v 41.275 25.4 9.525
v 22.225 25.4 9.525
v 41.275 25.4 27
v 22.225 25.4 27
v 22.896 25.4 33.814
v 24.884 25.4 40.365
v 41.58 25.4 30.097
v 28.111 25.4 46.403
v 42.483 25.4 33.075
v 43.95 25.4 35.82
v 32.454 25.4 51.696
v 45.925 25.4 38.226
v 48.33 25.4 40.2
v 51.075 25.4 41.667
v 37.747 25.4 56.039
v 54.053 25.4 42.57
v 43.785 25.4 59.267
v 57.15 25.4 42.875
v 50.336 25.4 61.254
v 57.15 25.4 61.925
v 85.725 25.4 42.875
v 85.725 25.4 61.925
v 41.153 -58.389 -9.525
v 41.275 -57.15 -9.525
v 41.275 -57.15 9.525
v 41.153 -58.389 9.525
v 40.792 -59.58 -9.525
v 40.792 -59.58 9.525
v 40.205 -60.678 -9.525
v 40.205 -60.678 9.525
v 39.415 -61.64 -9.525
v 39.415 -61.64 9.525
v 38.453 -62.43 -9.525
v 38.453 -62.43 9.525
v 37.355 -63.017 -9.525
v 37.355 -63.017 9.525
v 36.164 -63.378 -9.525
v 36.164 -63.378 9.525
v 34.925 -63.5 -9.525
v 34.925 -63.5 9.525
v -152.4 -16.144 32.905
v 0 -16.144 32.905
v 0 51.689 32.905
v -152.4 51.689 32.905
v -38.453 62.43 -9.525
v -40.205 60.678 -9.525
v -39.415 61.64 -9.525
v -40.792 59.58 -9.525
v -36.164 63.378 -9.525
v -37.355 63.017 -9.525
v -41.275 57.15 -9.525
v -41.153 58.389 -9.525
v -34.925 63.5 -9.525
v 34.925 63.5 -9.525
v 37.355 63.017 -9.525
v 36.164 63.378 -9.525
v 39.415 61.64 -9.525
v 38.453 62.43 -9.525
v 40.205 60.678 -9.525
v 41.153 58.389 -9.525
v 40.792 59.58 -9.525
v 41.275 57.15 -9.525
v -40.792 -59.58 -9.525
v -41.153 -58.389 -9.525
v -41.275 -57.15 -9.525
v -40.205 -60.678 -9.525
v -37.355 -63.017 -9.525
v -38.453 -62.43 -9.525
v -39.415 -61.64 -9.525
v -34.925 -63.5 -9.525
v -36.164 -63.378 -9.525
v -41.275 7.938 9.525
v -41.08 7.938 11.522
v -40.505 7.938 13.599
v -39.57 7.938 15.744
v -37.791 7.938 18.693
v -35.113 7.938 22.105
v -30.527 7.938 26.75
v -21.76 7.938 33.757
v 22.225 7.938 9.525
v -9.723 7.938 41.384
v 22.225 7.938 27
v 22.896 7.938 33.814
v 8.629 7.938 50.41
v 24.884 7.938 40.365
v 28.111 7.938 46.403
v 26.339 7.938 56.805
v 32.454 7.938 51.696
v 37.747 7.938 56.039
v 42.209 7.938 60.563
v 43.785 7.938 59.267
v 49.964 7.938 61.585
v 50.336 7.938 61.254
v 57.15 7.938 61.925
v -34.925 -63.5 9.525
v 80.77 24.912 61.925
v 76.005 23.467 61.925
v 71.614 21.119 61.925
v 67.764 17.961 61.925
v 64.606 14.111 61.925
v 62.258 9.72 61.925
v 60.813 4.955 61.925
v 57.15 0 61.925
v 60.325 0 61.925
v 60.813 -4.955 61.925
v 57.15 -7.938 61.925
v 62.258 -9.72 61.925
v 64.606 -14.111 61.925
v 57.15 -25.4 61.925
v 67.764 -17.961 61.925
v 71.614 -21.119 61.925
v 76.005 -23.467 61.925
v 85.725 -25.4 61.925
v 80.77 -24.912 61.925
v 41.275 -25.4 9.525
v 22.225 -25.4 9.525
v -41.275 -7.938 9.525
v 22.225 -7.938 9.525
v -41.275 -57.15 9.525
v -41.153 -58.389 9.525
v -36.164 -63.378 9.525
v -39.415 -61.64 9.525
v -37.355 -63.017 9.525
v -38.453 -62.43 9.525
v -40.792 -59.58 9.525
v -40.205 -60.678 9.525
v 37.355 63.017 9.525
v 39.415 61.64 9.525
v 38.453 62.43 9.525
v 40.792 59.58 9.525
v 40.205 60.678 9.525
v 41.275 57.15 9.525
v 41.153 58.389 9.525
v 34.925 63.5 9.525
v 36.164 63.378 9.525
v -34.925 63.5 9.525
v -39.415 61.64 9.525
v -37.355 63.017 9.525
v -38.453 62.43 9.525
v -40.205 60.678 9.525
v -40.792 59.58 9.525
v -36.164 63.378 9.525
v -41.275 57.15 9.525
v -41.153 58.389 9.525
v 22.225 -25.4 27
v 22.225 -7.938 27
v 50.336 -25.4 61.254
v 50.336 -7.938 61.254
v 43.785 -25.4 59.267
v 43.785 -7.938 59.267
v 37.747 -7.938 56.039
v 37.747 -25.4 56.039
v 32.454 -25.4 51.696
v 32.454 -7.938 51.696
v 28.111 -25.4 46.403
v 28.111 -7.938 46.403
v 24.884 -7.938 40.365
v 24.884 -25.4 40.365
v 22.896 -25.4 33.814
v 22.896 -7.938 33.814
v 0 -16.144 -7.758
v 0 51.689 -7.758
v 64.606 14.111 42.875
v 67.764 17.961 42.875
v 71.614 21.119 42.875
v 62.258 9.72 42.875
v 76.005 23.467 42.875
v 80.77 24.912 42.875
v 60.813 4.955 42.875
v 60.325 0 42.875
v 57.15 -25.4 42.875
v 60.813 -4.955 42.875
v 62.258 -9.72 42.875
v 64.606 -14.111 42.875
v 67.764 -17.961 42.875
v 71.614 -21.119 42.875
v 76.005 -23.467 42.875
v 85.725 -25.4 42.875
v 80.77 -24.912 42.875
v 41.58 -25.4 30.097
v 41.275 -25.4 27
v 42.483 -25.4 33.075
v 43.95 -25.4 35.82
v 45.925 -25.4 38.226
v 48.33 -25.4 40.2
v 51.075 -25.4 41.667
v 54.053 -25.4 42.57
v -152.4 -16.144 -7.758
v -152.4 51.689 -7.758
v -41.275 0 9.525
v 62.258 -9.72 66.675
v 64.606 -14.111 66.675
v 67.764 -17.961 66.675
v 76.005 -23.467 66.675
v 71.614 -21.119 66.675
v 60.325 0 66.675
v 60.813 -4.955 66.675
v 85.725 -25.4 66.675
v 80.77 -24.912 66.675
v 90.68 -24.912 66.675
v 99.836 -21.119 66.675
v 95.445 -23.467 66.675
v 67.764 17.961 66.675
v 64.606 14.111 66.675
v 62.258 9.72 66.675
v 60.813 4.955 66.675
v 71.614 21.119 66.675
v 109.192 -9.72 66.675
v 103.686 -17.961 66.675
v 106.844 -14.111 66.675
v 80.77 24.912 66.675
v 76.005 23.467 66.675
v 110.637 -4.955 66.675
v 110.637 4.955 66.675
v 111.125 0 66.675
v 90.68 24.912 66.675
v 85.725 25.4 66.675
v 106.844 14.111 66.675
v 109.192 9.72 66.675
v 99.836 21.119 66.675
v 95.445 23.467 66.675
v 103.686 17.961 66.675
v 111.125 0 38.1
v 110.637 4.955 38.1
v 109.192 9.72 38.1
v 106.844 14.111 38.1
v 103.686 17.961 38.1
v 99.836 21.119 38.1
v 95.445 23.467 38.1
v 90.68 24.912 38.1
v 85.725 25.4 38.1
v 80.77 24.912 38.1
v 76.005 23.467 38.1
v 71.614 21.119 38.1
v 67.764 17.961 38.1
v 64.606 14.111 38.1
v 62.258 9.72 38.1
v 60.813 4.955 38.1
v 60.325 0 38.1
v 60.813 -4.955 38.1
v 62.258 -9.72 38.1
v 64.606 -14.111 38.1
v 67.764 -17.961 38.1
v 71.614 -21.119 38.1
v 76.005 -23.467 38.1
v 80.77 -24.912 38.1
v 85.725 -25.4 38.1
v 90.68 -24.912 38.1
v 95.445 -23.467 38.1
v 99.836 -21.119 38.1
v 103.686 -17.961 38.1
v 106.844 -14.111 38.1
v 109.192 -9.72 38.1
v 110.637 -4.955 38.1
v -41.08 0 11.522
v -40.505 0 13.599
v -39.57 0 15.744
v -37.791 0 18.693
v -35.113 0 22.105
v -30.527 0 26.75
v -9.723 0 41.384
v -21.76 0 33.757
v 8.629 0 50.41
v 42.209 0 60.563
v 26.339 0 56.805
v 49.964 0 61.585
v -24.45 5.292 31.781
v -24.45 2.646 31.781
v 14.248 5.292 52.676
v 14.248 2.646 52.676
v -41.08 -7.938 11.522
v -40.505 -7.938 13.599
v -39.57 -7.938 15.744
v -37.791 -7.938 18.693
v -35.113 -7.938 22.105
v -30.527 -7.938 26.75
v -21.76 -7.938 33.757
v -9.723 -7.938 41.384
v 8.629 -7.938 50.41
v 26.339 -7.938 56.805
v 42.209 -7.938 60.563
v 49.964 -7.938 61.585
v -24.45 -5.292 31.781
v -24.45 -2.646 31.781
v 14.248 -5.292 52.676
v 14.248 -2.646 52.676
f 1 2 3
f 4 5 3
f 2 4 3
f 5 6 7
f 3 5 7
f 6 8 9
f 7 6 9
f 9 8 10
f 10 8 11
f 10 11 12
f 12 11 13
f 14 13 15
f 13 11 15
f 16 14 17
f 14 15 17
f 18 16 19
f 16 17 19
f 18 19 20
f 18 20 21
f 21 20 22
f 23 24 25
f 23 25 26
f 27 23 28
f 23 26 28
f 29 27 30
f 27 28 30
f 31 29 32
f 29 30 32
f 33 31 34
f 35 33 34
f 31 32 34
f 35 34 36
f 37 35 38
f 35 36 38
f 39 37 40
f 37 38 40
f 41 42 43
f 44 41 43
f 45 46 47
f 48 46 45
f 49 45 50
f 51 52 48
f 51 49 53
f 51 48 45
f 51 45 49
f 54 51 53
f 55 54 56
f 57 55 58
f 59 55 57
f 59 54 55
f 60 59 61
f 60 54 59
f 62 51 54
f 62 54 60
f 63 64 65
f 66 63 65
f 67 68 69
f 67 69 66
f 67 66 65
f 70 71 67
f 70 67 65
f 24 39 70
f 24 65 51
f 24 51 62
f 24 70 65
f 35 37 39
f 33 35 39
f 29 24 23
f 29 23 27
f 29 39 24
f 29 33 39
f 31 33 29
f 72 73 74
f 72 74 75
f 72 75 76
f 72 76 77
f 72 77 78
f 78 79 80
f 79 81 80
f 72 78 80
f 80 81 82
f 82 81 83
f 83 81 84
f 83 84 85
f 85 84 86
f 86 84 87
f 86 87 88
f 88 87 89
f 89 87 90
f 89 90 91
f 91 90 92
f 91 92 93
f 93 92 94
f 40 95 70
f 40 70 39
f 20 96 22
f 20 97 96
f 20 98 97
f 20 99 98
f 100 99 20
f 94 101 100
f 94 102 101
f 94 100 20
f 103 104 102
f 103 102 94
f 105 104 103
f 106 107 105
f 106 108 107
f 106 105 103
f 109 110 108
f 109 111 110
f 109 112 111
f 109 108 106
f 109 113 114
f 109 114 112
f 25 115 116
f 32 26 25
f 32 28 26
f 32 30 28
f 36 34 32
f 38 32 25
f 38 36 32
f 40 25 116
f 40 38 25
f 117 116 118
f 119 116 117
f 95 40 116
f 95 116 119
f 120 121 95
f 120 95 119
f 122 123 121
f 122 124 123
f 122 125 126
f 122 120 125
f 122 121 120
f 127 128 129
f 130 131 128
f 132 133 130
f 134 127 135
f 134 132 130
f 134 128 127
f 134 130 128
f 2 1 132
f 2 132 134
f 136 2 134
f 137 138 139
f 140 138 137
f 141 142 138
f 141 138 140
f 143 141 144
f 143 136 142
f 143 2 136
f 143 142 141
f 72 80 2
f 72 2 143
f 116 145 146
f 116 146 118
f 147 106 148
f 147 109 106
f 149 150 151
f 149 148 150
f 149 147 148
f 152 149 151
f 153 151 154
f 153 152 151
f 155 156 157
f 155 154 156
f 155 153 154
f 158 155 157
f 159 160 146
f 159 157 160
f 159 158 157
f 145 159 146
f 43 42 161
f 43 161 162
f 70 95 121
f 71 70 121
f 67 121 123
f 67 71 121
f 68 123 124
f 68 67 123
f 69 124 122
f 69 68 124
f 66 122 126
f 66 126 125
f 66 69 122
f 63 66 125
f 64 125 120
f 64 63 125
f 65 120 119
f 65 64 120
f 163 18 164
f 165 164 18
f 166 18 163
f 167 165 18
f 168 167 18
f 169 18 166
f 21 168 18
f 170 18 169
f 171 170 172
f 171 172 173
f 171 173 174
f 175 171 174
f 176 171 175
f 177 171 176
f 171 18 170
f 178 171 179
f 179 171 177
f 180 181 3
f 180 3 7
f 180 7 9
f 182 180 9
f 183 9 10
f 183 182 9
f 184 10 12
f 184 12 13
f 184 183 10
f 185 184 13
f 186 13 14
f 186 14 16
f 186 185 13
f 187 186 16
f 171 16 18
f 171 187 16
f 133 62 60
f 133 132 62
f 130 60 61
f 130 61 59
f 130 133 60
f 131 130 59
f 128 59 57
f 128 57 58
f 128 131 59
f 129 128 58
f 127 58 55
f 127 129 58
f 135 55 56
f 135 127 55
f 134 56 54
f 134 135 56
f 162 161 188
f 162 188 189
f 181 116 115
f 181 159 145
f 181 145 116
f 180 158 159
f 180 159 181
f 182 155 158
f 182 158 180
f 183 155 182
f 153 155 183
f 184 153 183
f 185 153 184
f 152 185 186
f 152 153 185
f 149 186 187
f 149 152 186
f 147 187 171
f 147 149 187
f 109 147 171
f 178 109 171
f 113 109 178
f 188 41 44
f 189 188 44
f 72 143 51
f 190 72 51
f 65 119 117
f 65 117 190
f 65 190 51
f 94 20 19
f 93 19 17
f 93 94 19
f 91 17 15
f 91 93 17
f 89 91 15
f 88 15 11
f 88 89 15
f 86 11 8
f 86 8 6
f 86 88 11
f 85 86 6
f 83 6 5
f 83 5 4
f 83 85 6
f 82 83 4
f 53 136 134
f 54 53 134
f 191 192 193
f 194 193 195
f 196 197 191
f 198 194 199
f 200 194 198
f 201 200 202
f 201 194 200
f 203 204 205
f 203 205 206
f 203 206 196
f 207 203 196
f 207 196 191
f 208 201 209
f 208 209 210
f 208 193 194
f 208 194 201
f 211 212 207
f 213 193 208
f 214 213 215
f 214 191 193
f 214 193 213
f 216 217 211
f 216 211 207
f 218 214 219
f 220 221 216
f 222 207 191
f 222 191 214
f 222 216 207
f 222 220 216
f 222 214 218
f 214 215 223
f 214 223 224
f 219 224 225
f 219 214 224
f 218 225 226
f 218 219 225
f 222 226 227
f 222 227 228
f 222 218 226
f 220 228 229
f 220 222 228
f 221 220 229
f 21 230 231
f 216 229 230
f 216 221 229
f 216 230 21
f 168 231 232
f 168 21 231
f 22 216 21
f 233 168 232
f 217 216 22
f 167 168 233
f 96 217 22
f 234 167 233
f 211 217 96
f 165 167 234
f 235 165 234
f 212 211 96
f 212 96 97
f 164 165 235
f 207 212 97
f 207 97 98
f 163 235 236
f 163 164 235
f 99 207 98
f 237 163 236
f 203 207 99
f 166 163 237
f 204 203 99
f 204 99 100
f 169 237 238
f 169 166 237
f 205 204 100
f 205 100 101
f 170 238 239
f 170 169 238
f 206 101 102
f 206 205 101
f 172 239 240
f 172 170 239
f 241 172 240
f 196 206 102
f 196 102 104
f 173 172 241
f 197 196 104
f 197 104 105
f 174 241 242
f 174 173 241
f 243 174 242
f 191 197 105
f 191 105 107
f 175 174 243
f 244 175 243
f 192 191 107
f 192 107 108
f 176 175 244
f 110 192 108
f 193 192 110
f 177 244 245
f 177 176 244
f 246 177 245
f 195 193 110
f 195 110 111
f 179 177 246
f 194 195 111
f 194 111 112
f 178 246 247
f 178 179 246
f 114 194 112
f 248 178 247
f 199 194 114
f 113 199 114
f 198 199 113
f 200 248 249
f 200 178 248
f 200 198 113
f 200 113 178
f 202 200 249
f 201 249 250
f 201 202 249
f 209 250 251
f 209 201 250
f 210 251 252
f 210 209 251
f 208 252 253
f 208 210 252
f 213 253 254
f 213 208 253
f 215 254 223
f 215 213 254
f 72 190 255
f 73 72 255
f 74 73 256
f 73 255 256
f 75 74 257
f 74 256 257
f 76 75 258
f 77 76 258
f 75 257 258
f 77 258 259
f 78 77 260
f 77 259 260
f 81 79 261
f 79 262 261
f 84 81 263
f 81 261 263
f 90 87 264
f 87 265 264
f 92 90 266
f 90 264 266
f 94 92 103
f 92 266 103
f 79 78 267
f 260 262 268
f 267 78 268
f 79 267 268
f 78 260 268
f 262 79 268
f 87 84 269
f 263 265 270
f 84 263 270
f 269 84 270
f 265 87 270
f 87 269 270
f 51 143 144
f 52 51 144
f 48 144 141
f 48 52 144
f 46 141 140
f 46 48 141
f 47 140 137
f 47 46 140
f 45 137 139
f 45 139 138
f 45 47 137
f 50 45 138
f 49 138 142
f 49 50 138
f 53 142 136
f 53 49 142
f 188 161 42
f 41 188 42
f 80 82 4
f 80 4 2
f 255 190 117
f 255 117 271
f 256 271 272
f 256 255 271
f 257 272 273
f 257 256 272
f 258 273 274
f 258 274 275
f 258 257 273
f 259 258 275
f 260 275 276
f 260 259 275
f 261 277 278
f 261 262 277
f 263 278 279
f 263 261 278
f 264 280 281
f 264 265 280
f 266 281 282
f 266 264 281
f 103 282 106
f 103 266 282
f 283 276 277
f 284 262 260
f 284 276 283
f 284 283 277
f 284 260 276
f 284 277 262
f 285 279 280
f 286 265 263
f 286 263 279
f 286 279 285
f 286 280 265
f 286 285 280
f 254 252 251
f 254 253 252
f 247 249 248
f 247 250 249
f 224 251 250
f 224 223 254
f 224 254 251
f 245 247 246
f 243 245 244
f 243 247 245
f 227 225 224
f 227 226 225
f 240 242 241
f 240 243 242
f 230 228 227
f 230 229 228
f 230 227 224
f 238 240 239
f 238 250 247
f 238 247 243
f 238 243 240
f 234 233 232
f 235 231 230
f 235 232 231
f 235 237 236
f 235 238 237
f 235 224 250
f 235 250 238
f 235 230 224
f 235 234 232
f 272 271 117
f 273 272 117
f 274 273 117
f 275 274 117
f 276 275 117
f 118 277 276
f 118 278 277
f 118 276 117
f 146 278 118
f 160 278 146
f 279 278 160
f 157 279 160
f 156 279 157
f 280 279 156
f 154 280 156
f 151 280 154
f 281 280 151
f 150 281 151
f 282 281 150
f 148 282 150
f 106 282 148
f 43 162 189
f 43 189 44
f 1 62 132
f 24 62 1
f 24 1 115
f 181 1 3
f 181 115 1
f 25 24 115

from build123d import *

# Parameters (mm, degrees)
F1_DEPTH = 63.5
F0_W     = 25.4
F0_H     = 19.05
F2_DEPTH = 25.4
F3_DEPTH = 7.9375
F5_R     = 6.35
F6_W     = 67.8333491087
F6_H     = 40.6632423401
F7_DEPTH = 152.4


with BuildPart() as f1:
    # F0 (on Front) → F1 (new body, symmetric)
    with BuildSketch(Plane.XZ):
        Polygon((41.275, -9.525), (41.275, 9.525), (22.225, 9.525), (-41.275, 9.525), (-41.275, -9.525), align=None)
    extrude(amount=F1_DEPTH, both=True)

    # F0 (on Front) → F2 (join, symmetric)
    with BuildSketch(Plane.XZ):
        with BuildLine():
            Line((22.225, 9.525), (41.275, 9.525))
            Line((41.275, 9.525), (41.275, 27.0002))
            ThreePointArc((41.275, 27.0002), (45.9246798487, 38.2255201513), (57.15, 42.8752))
            Line((57.15, 42.8752), (60.325, 42.8752))
            Line((60.325, 42.8752), (60.325, 61.9252))
            Line((60.325, 61.9252), (57.15, 61.9252))
            ThreePointArc((57.15, 61.9252), (32.4542956671, 51.6959043329), (22.225, 27.0002))
            Line((22.225, 27.0002), (22.225, 9.525))
        make_face()
        with Locations((73.025, 52.4002)):
            Rectangle(F0_W, F0_H)
    extrude(amount=F2_DEPTH, both=True)

    # F0 (on Front) → F3 (join, symmetric)
    with BuildSketch(Plane.XZ):
        with BuildLine():
            Line((-41.275, 9.525), (22.225, 9.525))
            Line((22.225, 9.525), (22.225, 27.0002))
            ThreePointArc((22.225, 27.0002), (32.4542956671, 51.6959043329), (57.15, 61.9252))
            add(Edge.make_bspline(
                [(-41.275, 9.525), (-41.275, 29.0353409946), (18.0341433734, 61.9252), (57.15, 61.9252)],
                knots=[0, 0, 0, 0, 111.5045361635, 111.5045361635, 111.5045361635, 111.5045361635], degree=3))
        make_face()
    extrude(amount=F3_DEPTH, both=True)

    # F0 (on Front) → F4 (revolve)
    with BuildSketch(Plane.XZ):
        Polygon((85.725, 61.9252), (85.725, 42.8752), (85.725, 38.1), (111.125, 38.1), (111.125, 66.675), (85.725, 66.675), align=None)
    revolve(axis=Axis((85.725, 0, 52.3875), (0, 0, 1)))

    # F5
    f5_edges = [f1.edges().sort_by_distance(p)[0] for p in [
        (41.275, -63.5, 0),
        (-41.275, -63.5, 0),
        (41.275, 63.5, 0),
        (-41.275, 63.5, 0),
    ]]
    fillet(f5_edges, radius=F5_R)


with BuildPart() as f7:
    # F6 (on Right) → F7 (new body)
    with BuildSketch(Plane.YZ):
        with Locations((17.7727490664, 12.5733539462)):
            Rectangle(F6_W, F6_H)
    extrude(amount=-F7_DEPTH)


solid = Compound([f1.part, f7.part])
